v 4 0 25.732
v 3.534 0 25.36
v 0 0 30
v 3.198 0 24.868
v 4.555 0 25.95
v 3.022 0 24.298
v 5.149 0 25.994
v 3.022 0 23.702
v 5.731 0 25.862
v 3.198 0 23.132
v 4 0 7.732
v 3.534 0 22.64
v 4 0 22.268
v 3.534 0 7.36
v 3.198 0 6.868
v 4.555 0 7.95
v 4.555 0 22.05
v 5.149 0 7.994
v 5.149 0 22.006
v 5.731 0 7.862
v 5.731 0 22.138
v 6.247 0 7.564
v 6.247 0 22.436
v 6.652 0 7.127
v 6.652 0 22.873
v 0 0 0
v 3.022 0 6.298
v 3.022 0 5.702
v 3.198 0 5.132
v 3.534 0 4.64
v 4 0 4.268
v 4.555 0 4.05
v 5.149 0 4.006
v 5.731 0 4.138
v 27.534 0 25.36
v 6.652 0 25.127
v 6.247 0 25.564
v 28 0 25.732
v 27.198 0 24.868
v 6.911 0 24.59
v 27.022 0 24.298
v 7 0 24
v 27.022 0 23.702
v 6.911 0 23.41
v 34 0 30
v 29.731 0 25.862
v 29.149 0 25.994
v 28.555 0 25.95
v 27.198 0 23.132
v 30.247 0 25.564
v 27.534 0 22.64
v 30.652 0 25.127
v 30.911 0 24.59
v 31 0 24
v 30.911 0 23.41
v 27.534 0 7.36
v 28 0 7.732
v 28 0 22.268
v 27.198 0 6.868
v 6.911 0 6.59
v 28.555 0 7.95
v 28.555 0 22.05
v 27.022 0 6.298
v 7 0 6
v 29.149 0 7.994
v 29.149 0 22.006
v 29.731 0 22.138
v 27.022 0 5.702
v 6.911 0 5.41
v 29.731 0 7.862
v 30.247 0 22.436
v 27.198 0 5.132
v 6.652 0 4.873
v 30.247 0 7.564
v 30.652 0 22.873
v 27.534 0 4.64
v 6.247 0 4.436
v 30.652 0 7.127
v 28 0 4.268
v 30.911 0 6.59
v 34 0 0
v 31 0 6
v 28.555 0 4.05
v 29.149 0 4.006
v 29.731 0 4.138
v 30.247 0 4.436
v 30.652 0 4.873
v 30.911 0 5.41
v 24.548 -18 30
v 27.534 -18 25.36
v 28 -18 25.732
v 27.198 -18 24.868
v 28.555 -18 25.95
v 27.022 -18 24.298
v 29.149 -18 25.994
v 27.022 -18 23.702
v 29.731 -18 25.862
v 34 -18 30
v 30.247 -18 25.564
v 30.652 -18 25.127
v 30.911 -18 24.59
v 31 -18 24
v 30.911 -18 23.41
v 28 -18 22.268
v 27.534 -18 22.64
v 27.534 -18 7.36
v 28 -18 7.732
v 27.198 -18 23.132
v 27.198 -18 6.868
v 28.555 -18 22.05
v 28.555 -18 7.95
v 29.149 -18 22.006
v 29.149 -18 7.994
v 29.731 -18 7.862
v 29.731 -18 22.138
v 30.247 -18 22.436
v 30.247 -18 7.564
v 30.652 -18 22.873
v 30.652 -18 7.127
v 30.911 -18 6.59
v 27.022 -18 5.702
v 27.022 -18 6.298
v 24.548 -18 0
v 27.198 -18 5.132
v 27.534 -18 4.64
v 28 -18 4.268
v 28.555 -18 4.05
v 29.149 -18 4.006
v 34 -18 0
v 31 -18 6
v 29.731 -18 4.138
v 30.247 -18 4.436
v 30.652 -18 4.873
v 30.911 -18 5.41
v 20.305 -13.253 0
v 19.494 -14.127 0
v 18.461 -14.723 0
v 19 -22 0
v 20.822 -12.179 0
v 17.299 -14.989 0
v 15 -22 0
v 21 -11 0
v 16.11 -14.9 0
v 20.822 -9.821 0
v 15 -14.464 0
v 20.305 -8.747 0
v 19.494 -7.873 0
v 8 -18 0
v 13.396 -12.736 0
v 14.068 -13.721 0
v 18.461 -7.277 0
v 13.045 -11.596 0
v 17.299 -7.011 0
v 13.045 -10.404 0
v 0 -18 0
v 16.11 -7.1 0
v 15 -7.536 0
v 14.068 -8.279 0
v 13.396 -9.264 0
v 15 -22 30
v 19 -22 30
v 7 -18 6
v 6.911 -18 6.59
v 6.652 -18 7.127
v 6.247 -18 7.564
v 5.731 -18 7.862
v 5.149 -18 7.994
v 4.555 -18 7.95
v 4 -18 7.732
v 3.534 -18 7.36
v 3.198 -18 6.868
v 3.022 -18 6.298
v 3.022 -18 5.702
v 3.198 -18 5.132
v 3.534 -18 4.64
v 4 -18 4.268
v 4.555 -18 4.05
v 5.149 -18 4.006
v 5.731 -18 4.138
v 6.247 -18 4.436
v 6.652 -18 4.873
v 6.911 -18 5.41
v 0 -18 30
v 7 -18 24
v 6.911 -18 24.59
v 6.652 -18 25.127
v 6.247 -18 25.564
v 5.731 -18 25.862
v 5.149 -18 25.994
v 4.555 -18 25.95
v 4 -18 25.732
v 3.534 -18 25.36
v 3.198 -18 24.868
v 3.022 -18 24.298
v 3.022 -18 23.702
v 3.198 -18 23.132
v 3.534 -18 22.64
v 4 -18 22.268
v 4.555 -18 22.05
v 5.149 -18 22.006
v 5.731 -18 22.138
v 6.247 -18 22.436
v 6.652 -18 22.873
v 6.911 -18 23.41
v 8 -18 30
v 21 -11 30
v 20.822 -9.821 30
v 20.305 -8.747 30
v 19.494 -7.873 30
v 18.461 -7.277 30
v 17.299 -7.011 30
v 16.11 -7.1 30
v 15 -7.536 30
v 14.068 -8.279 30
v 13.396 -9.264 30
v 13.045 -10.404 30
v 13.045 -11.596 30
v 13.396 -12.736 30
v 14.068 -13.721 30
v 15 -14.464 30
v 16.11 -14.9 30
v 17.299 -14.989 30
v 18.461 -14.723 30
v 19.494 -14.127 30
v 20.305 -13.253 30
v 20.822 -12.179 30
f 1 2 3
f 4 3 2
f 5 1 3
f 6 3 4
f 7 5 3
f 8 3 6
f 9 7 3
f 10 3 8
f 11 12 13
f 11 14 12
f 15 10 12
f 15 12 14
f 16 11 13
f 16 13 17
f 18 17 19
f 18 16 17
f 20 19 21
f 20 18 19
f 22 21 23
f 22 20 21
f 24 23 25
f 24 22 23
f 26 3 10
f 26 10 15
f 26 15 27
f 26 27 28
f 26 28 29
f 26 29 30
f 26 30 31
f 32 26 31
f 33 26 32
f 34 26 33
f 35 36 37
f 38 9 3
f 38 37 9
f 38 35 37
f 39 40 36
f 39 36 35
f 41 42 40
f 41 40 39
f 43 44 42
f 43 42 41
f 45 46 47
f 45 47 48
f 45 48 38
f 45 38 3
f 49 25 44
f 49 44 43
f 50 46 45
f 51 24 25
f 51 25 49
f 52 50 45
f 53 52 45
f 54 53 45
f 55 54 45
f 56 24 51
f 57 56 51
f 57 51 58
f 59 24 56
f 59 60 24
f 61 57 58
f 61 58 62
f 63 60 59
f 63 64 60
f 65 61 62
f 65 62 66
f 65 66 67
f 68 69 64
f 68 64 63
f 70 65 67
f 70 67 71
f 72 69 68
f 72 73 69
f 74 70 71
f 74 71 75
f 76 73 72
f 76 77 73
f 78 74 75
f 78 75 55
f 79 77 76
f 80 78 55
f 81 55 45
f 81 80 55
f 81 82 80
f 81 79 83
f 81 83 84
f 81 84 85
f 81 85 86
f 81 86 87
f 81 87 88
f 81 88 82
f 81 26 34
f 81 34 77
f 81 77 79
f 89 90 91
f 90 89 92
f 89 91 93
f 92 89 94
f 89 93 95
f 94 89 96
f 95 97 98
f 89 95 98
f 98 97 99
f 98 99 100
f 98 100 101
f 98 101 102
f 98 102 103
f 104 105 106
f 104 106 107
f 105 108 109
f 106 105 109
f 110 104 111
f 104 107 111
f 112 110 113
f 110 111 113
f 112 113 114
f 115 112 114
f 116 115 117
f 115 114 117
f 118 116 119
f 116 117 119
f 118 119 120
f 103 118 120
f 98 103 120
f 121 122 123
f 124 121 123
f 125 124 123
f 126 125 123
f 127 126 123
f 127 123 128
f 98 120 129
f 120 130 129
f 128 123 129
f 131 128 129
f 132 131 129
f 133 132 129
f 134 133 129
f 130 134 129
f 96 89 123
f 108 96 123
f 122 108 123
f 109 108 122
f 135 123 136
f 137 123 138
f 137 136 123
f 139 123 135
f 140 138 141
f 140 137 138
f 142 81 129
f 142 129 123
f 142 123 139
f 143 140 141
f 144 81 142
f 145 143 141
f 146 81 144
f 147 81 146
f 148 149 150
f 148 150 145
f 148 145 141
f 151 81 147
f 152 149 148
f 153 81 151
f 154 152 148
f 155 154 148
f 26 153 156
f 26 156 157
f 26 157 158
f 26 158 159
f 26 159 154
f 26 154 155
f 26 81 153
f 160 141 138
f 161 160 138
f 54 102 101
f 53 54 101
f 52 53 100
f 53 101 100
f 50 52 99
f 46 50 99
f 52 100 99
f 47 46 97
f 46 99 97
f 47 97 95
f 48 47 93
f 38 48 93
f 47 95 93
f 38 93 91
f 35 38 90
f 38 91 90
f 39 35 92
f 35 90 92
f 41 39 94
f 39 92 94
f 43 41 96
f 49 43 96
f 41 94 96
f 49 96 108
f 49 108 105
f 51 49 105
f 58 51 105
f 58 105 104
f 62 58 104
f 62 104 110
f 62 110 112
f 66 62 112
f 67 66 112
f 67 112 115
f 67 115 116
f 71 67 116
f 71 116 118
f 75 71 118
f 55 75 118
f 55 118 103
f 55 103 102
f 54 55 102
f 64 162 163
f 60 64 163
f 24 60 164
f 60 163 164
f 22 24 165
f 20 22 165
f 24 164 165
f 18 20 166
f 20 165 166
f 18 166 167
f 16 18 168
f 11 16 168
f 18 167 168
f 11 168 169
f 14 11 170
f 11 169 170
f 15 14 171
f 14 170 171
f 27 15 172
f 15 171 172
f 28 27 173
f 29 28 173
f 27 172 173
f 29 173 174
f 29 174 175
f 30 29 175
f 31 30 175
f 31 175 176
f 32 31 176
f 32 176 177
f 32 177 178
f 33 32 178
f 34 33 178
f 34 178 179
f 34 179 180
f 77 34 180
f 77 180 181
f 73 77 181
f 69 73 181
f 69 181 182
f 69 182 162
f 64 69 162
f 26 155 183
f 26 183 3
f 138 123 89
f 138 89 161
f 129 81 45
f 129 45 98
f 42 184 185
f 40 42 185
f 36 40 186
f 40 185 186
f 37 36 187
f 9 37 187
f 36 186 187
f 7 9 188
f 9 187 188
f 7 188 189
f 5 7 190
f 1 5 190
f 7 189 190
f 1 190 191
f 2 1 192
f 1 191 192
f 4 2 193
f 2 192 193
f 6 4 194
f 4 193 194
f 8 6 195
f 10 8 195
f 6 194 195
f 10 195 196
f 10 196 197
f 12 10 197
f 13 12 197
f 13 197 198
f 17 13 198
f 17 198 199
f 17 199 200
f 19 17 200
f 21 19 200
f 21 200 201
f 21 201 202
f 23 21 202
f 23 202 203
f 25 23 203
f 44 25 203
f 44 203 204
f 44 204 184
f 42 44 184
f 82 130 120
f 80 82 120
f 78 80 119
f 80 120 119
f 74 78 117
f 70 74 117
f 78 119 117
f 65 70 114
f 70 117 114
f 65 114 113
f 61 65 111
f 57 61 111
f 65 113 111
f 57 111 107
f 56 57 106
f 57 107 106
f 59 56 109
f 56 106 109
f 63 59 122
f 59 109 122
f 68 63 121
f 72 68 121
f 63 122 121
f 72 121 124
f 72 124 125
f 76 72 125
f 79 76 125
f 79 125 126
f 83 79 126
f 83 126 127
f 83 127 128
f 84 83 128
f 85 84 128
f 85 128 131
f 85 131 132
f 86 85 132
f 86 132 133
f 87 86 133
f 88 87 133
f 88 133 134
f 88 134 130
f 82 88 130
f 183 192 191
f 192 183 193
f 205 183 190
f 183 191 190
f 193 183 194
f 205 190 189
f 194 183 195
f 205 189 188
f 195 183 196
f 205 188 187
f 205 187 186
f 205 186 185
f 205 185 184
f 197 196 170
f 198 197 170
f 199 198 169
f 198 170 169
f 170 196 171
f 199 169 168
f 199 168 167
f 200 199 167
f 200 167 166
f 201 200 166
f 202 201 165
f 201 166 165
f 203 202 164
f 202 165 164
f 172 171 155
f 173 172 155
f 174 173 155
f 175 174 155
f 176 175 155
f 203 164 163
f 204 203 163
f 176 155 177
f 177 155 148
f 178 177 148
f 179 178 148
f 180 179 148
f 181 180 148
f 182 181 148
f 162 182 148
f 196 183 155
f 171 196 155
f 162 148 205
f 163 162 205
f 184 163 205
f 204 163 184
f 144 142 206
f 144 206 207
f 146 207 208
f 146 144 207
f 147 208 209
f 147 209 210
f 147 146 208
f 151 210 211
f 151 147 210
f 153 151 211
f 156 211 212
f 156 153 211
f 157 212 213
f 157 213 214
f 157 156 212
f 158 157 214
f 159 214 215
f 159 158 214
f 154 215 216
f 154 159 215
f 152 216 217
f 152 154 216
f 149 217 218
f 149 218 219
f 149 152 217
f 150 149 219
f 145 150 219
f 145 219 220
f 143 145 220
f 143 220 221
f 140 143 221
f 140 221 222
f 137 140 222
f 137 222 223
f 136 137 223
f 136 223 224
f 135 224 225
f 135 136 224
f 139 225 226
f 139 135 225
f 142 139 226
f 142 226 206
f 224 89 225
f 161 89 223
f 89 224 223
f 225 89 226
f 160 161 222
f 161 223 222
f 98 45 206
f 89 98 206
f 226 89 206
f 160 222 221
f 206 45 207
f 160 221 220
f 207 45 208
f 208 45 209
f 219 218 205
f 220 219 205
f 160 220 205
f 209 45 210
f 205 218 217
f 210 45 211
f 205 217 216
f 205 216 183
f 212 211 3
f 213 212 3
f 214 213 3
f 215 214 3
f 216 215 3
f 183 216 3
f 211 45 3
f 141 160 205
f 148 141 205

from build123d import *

# Parameters (mm, degrees)
SKETCH2_R           = 4
BOSS_EXTRUDE1_DEPTH = 30
SKETCH4_R           = 2
CUT_EXTRUDE1_DEPTH  = 19


with BuildPart() as part:
    # Sketch2 → Boss-Extrude1 (new body)
    with BuildSketch(Plane.XY):
        Polygon((0, 0), (34, 0), (34, -18), (27.548015077, -18), (24.548015077, -18), (19, -22), (17, -22), (15, -22), (8, -18), (5, -18), (0, -18), align=None)
        with Locations((17, -11)):
            Circle(SKETCH2_R, mode=Mode.SUBTRACT)
    extrude(amount=BOSS_EXTRUDE1_DEPTH)

    # Sketch4 → Cut-Extrude1 (cut, through all)
    with BuildSketch(Plane.XZ.offset(18)):
        with Locations((5, 6)):
            Circle(SKETCH4_R)
        with Locations((29, 6)):
            Circle(SKETCH4_R)
        with Locations((5, 24)):
            Circle(SKETCH4_R)
        with Locations((29, 24)):
            Circle(SKETCH4_R)
    extrude(amount=-CUT_EXTRUDE1_DEPTH, mode=Mode.SUBTRACT)


solid = part.part
